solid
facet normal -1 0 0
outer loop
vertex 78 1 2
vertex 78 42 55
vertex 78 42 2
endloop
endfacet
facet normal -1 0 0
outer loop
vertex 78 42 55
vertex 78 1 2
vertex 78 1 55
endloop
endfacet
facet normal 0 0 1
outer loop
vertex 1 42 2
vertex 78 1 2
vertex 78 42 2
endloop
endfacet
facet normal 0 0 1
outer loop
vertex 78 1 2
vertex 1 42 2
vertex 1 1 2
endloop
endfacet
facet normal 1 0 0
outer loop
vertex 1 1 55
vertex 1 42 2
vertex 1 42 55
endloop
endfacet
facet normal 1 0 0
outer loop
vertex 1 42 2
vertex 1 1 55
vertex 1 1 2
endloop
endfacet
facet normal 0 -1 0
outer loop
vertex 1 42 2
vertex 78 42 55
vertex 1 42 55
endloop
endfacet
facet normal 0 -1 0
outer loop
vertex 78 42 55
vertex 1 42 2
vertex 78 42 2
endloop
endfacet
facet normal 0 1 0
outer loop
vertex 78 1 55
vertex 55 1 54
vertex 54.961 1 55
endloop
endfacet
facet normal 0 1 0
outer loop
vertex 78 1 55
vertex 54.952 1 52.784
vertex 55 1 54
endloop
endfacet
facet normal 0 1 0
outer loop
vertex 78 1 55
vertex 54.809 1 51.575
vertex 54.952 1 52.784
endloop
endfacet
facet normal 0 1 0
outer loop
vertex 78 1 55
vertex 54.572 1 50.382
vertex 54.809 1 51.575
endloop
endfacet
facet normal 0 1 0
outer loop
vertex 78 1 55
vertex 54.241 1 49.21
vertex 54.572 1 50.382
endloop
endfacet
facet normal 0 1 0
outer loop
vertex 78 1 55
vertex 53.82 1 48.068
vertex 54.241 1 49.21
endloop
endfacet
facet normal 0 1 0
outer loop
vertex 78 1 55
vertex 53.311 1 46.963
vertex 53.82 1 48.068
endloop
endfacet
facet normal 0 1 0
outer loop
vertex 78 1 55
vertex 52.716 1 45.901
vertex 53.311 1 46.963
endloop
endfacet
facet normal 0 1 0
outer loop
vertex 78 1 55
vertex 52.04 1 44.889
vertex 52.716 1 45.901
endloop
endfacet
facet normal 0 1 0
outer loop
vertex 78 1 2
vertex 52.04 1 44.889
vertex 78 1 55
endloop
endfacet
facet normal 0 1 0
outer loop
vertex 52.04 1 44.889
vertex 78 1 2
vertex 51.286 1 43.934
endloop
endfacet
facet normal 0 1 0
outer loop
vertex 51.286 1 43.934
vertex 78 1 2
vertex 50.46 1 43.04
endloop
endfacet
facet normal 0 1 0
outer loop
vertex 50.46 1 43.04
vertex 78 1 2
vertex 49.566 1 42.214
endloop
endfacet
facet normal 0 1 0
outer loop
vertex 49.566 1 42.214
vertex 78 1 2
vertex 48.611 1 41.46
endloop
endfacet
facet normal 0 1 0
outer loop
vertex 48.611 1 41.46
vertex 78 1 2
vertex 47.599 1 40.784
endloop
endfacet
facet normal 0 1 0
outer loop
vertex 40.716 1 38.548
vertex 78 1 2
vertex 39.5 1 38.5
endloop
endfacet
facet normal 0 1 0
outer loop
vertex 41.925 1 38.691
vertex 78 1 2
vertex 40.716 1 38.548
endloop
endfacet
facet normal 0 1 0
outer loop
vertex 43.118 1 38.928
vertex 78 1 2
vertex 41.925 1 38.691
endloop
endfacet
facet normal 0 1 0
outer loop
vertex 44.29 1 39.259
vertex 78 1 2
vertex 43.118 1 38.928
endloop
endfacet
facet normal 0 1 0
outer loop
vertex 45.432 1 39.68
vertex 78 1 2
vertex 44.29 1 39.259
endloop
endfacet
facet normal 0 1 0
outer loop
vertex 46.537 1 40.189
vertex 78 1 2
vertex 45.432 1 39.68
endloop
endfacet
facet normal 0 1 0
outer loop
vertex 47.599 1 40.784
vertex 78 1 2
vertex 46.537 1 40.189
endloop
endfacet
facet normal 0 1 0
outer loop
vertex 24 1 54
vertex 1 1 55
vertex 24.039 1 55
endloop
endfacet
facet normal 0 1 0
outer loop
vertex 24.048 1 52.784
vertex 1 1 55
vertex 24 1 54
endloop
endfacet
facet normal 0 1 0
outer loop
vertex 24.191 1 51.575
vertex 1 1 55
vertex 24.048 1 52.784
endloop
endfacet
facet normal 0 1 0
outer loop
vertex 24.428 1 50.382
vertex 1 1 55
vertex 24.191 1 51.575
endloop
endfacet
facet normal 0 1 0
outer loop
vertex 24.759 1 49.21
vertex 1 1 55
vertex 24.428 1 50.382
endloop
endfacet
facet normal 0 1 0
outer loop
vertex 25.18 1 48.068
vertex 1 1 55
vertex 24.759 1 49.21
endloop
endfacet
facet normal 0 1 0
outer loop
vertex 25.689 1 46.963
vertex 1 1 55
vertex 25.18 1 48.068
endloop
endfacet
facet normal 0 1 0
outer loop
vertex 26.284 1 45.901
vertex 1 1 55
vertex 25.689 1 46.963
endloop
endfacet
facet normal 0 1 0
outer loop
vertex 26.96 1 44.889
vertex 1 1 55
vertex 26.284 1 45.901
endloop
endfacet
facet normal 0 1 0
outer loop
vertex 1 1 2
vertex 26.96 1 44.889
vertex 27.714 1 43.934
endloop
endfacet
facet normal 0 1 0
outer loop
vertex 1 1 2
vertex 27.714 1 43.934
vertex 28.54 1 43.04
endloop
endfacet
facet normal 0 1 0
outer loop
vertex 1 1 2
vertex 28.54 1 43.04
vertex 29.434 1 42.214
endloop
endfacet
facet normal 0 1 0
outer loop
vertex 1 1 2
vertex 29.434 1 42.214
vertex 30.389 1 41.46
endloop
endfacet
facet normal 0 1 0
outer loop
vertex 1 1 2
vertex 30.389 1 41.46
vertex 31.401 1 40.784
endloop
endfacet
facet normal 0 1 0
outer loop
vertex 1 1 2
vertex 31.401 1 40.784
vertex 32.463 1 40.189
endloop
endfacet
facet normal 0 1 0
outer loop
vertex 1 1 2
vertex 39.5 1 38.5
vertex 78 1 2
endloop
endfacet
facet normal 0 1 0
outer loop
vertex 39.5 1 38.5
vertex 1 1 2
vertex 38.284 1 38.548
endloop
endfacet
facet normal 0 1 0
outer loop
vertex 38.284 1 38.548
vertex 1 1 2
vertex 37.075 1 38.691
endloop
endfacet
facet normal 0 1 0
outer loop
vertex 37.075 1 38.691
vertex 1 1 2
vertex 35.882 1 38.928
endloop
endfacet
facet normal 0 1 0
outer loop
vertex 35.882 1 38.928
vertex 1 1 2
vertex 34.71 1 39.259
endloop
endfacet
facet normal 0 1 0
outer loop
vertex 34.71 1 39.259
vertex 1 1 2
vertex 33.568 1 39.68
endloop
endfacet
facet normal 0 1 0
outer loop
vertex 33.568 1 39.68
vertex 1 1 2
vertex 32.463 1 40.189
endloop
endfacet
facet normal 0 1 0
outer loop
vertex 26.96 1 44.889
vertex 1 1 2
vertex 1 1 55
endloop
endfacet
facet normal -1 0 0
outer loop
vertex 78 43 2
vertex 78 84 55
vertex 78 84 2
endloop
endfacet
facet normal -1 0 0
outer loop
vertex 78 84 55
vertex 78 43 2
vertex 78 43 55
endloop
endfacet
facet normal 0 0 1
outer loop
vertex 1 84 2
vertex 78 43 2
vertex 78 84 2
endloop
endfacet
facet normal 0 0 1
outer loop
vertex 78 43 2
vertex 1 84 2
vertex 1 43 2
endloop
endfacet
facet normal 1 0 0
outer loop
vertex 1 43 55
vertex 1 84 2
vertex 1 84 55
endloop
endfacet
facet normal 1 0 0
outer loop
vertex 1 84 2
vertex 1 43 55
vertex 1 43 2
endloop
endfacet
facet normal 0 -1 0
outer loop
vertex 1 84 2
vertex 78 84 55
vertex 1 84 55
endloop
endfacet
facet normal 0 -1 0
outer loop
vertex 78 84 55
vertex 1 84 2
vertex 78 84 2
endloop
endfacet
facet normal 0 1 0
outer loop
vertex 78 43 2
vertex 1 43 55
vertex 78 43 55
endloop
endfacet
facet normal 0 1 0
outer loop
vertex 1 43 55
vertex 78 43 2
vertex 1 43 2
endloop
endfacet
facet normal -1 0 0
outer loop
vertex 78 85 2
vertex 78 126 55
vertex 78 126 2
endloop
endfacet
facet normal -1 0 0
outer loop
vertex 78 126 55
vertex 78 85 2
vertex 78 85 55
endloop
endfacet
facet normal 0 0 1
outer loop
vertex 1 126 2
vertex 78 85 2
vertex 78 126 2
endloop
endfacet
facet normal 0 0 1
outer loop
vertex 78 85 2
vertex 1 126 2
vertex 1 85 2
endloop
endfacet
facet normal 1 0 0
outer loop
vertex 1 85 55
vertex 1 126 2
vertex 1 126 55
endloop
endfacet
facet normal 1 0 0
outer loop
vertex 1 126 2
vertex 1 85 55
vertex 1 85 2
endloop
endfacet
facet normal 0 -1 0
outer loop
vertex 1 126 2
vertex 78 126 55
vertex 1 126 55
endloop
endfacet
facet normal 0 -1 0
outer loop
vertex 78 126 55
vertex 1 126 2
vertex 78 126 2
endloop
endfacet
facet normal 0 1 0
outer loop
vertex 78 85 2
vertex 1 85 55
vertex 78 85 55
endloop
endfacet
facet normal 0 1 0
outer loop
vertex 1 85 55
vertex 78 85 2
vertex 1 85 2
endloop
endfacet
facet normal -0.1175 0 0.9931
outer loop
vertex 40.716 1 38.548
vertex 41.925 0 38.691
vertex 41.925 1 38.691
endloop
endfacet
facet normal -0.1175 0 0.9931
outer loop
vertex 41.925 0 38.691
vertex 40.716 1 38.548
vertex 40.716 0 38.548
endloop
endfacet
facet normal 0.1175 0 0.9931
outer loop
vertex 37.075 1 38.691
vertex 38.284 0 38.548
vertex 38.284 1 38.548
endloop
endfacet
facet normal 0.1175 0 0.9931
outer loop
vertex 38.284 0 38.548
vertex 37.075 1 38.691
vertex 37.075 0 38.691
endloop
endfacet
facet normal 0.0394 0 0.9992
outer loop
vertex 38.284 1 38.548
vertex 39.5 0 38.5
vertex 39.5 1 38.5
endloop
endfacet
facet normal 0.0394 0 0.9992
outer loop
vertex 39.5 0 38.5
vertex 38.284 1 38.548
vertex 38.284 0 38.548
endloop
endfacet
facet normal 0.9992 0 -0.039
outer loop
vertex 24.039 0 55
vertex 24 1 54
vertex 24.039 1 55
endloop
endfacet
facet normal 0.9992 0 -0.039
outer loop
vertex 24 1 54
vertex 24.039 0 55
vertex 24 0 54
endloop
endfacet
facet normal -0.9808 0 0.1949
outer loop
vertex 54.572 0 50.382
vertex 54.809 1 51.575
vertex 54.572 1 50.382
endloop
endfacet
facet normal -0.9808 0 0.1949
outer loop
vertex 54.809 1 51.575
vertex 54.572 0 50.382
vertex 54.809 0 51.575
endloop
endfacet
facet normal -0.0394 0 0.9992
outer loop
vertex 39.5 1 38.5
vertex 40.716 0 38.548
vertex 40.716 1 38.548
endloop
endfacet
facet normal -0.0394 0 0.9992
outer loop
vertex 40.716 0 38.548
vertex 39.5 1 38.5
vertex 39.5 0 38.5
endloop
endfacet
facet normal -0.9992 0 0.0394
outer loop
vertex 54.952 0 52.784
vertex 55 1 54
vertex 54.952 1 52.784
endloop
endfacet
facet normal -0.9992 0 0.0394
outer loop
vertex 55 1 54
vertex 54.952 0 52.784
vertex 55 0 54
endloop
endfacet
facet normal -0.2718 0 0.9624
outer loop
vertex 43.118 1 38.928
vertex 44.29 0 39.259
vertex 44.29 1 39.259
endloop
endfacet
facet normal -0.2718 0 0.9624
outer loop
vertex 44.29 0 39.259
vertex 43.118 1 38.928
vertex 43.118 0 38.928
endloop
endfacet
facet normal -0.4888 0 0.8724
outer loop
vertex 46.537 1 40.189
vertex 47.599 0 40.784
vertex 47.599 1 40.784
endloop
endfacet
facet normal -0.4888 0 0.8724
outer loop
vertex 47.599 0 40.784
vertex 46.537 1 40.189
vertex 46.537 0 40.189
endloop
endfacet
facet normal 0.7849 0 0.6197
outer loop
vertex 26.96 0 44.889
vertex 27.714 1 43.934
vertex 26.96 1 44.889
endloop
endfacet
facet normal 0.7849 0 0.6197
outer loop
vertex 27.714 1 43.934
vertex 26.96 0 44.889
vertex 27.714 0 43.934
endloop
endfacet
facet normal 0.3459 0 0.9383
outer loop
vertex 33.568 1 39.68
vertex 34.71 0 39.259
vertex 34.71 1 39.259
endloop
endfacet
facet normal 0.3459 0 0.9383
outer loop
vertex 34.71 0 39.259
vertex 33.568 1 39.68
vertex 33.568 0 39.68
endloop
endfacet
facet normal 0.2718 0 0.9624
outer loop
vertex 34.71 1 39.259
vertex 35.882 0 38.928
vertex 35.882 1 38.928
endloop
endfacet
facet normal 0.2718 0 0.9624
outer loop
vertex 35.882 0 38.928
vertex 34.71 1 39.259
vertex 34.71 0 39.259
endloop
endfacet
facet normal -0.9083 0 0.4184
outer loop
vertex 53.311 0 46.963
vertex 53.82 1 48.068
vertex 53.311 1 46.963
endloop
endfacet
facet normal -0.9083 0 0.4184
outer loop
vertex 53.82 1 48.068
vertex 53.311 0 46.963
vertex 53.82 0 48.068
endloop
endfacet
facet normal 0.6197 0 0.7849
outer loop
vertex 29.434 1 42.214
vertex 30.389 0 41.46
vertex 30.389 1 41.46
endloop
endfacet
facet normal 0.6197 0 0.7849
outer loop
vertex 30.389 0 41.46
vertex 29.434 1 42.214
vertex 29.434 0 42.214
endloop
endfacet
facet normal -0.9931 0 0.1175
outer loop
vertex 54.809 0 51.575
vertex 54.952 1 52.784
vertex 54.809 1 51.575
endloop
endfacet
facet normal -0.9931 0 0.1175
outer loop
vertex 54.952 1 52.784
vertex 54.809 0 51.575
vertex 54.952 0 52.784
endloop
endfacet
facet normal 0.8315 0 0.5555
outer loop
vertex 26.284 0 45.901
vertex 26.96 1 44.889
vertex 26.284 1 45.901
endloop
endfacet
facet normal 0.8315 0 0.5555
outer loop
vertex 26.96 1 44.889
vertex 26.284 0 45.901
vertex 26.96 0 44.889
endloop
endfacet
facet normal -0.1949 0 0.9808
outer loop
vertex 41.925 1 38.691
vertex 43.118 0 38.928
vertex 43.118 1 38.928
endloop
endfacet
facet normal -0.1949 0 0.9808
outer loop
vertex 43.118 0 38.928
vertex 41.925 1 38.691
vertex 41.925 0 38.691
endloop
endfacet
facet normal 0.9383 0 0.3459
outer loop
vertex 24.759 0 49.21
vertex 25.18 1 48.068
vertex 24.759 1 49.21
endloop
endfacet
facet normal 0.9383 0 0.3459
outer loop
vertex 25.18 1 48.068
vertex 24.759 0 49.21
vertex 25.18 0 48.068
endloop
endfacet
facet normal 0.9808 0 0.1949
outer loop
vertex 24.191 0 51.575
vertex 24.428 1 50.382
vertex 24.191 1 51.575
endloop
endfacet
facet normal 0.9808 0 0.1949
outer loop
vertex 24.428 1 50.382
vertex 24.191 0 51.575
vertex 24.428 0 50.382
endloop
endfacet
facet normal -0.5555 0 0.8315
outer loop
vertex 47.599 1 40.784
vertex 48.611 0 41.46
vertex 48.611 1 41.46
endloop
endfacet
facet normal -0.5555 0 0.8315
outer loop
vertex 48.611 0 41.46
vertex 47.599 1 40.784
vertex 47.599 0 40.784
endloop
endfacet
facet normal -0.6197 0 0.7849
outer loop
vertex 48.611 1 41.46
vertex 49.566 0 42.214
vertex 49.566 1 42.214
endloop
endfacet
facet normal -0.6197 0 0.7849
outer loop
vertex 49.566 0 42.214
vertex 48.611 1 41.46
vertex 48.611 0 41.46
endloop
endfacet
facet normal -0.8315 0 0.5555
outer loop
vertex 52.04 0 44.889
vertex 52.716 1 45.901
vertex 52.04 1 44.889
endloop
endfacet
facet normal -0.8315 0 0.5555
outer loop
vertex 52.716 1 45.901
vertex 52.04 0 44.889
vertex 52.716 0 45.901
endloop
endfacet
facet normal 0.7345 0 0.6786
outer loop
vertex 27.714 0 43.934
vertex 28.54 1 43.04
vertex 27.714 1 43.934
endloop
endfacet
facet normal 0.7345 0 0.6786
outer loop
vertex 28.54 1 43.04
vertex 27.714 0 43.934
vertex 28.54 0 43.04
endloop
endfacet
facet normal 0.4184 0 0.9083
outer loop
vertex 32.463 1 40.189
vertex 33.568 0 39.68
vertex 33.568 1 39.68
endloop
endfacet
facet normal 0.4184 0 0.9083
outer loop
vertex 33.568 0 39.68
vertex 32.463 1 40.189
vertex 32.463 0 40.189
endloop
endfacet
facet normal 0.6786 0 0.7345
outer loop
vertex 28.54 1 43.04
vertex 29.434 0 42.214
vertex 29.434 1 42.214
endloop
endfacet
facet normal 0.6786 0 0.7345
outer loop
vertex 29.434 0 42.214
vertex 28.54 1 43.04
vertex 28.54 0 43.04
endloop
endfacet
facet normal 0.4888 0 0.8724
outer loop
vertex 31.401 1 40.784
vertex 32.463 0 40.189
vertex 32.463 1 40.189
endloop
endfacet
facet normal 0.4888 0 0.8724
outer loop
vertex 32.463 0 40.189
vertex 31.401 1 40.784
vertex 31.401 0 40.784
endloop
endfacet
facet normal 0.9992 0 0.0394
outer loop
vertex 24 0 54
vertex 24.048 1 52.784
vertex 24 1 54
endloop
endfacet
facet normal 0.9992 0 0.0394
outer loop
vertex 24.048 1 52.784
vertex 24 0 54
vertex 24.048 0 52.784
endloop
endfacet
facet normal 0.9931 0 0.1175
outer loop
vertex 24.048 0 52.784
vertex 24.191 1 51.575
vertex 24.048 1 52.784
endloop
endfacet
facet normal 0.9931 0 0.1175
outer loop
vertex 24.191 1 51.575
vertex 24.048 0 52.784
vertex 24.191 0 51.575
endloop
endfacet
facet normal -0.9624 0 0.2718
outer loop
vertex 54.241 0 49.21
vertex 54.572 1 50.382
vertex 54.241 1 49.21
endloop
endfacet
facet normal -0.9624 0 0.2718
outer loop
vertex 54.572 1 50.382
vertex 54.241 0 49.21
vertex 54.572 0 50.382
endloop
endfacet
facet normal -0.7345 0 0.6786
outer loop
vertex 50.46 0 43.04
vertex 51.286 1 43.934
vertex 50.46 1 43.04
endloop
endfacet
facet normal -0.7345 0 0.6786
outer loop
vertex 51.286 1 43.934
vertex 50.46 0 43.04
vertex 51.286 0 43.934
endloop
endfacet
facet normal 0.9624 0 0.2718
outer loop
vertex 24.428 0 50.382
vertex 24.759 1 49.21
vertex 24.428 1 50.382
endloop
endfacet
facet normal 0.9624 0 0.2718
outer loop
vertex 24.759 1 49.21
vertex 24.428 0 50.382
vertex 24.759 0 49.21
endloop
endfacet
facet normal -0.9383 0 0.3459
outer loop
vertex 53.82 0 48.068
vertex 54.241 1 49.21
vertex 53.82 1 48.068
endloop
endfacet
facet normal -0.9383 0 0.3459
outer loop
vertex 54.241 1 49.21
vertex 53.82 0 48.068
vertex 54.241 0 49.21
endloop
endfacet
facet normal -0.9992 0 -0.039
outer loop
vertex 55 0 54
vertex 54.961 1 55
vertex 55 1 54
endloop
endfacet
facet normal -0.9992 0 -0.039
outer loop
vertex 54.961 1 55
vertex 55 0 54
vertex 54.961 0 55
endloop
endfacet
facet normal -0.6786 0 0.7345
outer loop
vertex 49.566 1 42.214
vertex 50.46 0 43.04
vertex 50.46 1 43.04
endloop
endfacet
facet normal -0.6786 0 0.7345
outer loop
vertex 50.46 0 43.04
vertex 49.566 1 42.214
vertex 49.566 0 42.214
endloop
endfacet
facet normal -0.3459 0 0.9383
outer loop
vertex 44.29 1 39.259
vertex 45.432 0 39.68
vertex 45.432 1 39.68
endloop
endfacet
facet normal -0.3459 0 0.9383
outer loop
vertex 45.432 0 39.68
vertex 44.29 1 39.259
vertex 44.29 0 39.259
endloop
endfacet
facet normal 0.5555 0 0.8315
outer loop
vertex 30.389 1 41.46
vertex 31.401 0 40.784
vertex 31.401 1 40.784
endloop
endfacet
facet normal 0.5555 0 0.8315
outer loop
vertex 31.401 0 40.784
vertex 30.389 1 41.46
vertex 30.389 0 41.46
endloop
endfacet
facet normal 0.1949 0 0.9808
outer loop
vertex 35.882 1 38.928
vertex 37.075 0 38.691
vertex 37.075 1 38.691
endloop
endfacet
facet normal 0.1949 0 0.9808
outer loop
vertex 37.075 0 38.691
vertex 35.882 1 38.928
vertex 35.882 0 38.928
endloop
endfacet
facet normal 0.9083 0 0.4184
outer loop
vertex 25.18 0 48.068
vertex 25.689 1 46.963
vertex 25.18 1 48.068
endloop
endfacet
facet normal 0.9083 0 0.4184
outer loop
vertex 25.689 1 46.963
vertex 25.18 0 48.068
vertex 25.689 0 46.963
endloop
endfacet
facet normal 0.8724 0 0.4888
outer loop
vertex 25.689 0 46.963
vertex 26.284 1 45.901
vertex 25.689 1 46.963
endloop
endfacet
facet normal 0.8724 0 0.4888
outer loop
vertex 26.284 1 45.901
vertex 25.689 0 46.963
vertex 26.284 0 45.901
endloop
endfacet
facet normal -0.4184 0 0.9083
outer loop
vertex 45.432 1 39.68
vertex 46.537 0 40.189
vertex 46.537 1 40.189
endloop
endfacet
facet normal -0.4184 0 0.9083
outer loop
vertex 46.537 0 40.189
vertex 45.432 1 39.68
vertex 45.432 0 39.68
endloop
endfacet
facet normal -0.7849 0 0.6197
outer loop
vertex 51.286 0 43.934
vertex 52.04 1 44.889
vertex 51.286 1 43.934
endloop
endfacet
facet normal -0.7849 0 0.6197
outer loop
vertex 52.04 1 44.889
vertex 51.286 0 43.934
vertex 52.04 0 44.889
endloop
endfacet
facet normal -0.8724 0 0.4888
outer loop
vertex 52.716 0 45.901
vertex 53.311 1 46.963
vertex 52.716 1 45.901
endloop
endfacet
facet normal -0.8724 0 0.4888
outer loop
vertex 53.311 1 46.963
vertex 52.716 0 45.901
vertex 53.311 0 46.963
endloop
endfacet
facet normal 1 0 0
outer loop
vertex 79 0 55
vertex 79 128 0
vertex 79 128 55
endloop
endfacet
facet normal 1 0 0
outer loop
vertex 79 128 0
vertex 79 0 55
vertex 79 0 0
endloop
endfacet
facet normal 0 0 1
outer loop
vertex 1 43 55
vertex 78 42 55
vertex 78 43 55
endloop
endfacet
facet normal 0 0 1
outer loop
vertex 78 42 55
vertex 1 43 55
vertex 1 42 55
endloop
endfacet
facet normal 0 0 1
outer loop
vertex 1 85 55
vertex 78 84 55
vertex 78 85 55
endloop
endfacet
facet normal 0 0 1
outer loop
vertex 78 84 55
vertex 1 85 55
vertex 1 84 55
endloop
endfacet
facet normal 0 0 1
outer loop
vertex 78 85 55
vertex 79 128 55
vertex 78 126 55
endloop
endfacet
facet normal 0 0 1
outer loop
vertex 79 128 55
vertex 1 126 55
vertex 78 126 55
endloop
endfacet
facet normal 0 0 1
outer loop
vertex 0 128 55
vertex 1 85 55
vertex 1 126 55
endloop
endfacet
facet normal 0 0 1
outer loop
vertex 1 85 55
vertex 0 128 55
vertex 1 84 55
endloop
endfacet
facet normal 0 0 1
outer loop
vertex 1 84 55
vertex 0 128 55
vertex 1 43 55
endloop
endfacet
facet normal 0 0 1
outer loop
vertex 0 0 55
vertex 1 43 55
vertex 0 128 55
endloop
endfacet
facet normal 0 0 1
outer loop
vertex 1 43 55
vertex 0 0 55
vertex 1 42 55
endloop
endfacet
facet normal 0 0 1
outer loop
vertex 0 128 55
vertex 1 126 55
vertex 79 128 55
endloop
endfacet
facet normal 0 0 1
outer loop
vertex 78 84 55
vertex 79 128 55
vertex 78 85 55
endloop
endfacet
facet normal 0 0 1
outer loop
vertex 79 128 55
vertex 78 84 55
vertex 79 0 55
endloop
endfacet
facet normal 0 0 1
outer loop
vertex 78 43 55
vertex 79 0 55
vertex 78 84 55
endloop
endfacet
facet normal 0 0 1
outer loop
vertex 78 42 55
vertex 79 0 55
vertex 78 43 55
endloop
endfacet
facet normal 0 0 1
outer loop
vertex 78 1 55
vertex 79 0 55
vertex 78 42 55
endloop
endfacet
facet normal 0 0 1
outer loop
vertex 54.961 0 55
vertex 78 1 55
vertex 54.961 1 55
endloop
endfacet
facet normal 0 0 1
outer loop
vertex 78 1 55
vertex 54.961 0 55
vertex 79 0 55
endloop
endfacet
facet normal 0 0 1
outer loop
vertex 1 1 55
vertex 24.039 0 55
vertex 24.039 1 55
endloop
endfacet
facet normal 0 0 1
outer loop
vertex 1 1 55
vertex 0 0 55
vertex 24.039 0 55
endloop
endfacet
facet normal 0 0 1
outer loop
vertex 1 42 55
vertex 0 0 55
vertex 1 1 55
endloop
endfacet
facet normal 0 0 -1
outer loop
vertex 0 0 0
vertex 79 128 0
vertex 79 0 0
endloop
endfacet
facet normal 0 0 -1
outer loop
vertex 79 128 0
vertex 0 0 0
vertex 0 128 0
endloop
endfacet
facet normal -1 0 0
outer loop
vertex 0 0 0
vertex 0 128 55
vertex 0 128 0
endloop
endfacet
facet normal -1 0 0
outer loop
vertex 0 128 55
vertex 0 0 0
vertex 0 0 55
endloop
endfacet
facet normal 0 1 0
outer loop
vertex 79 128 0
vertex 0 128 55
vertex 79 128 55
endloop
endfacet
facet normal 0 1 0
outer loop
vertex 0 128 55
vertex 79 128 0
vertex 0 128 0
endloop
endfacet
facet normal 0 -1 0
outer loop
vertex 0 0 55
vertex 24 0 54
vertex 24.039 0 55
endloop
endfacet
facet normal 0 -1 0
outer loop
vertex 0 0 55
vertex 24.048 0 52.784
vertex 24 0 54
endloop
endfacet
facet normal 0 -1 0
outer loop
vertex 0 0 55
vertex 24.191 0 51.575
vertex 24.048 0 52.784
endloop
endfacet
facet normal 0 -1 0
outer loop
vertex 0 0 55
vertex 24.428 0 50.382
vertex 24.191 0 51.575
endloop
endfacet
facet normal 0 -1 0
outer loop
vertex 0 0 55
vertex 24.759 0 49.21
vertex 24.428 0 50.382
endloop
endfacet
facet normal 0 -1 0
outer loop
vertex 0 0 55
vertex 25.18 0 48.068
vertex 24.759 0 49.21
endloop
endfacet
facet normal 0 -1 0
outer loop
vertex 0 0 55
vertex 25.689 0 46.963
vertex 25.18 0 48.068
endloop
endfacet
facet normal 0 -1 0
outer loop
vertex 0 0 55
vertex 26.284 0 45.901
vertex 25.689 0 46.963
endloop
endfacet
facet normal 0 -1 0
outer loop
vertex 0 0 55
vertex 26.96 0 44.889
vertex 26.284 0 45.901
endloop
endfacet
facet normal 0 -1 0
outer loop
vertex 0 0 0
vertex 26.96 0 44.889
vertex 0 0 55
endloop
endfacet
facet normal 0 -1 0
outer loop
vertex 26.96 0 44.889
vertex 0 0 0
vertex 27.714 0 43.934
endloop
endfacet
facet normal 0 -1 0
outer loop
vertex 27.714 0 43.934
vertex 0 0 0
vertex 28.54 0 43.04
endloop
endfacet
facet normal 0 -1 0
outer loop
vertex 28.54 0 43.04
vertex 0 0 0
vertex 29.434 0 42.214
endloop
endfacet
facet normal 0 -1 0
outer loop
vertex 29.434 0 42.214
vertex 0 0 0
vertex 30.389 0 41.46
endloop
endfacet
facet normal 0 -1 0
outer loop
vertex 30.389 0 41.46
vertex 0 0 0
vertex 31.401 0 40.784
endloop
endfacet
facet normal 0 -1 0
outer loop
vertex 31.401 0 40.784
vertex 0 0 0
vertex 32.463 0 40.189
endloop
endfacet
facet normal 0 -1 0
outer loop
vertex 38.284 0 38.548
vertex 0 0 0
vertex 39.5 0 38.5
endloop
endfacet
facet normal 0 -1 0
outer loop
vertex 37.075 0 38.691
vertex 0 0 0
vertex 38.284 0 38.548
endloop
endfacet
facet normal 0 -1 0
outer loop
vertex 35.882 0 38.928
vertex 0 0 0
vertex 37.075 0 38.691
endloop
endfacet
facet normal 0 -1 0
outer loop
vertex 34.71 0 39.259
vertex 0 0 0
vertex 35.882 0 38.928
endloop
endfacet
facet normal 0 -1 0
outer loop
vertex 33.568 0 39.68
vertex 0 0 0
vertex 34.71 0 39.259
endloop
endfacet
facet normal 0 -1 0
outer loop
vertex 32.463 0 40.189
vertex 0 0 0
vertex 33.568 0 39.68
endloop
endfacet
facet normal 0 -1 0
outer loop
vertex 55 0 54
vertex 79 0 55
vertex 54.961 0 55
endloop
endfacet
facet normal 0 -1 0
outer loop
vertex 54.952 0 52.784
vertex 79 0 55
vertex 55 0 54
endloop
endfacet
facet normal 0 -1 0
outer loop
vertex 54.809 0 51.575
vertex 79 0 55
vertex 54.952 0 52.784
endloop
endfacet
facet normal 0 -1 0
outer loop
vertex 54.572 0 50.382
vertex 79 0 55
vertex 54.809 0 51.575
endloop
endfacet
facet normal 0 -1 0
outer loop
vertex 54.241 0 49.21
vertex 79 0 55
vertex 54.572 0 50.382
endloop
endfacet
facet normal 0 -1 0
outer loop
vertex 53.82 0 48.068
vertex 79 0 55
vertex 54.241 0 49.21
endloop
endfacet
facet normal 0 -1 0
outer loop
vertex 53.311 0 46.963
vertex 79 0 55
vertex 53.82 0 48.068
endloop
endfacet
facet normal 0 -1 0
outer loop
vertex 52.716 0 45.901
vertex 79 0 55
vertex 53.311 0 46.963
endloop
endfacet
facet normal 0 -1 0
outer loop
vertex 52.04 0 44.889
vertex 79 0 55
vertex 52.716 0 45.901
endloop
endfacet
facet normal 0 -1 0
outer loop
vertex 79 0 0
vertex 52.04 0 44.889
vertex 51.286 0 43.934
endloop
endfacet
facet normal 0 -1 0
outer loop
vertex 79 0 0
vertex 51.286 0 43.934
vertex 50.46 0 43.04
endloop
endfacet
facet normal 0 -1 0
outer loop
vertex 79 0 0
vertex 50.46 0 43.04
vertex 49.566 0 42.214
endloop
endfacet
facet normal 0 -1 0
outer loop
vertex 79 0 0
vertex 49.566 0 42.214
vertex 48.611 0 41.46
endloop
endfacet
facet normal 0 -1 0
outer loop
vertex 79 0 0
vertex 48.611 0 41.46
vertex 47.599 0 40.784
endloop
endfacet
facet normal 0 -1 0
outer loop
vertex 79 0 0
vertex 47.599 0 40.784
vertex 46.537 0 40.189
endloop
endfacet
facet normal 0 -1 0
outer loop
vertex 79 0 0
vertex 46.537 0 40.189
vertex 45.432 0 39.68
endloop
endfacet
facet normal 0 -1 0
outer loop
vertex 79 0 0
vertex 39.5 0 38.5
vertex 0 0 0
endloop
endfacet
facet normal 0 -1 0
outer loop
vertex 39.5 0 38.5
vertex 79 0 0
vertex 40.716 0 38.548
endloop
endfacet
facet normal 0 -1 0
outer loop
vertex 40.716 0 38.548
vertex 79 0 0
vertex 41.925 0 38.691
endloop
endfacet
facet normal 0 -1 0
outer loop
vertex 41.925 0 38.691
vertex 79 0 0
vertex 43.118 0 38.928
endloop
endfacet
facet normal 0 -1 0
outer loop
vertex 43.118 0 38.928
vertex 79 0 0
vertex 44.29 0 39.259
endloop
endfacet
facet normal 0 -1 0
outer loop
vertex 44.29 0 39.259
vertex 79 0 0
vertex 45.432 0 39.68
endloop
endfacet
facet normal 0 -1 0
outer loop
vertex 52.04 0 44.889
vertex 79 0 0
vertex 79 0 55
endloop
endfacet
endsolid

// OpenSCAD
/*
 * © 2021 Louis Kowolowski
 *
 * Insert for small hobbyzone drawer to hold pe tools like saws, umm scribers,
 * and misc bits
 */
difference () {
	// whole insert as a cube
	color ("grey") cube ([79, 128, 55]);

	union () {
		// Bulk storage area
		translate ([1, 1, 2]) {
			color ("grey") cube ([77, 41, 54]);
		}

		translate ([1, 43, 2]) {
			color ("grey") cube ([77, 41, 54]);
		}

		translate ([1, 85, 2]) {
			color ("grey") cube ([77, 41, 54]);
		}

		translate ([39.5, -1, 54]) {
			rotate ([0, 90, 90]) {
				cylinder (5, d=31, $fn=80, true);
			}
		}
	}
}
